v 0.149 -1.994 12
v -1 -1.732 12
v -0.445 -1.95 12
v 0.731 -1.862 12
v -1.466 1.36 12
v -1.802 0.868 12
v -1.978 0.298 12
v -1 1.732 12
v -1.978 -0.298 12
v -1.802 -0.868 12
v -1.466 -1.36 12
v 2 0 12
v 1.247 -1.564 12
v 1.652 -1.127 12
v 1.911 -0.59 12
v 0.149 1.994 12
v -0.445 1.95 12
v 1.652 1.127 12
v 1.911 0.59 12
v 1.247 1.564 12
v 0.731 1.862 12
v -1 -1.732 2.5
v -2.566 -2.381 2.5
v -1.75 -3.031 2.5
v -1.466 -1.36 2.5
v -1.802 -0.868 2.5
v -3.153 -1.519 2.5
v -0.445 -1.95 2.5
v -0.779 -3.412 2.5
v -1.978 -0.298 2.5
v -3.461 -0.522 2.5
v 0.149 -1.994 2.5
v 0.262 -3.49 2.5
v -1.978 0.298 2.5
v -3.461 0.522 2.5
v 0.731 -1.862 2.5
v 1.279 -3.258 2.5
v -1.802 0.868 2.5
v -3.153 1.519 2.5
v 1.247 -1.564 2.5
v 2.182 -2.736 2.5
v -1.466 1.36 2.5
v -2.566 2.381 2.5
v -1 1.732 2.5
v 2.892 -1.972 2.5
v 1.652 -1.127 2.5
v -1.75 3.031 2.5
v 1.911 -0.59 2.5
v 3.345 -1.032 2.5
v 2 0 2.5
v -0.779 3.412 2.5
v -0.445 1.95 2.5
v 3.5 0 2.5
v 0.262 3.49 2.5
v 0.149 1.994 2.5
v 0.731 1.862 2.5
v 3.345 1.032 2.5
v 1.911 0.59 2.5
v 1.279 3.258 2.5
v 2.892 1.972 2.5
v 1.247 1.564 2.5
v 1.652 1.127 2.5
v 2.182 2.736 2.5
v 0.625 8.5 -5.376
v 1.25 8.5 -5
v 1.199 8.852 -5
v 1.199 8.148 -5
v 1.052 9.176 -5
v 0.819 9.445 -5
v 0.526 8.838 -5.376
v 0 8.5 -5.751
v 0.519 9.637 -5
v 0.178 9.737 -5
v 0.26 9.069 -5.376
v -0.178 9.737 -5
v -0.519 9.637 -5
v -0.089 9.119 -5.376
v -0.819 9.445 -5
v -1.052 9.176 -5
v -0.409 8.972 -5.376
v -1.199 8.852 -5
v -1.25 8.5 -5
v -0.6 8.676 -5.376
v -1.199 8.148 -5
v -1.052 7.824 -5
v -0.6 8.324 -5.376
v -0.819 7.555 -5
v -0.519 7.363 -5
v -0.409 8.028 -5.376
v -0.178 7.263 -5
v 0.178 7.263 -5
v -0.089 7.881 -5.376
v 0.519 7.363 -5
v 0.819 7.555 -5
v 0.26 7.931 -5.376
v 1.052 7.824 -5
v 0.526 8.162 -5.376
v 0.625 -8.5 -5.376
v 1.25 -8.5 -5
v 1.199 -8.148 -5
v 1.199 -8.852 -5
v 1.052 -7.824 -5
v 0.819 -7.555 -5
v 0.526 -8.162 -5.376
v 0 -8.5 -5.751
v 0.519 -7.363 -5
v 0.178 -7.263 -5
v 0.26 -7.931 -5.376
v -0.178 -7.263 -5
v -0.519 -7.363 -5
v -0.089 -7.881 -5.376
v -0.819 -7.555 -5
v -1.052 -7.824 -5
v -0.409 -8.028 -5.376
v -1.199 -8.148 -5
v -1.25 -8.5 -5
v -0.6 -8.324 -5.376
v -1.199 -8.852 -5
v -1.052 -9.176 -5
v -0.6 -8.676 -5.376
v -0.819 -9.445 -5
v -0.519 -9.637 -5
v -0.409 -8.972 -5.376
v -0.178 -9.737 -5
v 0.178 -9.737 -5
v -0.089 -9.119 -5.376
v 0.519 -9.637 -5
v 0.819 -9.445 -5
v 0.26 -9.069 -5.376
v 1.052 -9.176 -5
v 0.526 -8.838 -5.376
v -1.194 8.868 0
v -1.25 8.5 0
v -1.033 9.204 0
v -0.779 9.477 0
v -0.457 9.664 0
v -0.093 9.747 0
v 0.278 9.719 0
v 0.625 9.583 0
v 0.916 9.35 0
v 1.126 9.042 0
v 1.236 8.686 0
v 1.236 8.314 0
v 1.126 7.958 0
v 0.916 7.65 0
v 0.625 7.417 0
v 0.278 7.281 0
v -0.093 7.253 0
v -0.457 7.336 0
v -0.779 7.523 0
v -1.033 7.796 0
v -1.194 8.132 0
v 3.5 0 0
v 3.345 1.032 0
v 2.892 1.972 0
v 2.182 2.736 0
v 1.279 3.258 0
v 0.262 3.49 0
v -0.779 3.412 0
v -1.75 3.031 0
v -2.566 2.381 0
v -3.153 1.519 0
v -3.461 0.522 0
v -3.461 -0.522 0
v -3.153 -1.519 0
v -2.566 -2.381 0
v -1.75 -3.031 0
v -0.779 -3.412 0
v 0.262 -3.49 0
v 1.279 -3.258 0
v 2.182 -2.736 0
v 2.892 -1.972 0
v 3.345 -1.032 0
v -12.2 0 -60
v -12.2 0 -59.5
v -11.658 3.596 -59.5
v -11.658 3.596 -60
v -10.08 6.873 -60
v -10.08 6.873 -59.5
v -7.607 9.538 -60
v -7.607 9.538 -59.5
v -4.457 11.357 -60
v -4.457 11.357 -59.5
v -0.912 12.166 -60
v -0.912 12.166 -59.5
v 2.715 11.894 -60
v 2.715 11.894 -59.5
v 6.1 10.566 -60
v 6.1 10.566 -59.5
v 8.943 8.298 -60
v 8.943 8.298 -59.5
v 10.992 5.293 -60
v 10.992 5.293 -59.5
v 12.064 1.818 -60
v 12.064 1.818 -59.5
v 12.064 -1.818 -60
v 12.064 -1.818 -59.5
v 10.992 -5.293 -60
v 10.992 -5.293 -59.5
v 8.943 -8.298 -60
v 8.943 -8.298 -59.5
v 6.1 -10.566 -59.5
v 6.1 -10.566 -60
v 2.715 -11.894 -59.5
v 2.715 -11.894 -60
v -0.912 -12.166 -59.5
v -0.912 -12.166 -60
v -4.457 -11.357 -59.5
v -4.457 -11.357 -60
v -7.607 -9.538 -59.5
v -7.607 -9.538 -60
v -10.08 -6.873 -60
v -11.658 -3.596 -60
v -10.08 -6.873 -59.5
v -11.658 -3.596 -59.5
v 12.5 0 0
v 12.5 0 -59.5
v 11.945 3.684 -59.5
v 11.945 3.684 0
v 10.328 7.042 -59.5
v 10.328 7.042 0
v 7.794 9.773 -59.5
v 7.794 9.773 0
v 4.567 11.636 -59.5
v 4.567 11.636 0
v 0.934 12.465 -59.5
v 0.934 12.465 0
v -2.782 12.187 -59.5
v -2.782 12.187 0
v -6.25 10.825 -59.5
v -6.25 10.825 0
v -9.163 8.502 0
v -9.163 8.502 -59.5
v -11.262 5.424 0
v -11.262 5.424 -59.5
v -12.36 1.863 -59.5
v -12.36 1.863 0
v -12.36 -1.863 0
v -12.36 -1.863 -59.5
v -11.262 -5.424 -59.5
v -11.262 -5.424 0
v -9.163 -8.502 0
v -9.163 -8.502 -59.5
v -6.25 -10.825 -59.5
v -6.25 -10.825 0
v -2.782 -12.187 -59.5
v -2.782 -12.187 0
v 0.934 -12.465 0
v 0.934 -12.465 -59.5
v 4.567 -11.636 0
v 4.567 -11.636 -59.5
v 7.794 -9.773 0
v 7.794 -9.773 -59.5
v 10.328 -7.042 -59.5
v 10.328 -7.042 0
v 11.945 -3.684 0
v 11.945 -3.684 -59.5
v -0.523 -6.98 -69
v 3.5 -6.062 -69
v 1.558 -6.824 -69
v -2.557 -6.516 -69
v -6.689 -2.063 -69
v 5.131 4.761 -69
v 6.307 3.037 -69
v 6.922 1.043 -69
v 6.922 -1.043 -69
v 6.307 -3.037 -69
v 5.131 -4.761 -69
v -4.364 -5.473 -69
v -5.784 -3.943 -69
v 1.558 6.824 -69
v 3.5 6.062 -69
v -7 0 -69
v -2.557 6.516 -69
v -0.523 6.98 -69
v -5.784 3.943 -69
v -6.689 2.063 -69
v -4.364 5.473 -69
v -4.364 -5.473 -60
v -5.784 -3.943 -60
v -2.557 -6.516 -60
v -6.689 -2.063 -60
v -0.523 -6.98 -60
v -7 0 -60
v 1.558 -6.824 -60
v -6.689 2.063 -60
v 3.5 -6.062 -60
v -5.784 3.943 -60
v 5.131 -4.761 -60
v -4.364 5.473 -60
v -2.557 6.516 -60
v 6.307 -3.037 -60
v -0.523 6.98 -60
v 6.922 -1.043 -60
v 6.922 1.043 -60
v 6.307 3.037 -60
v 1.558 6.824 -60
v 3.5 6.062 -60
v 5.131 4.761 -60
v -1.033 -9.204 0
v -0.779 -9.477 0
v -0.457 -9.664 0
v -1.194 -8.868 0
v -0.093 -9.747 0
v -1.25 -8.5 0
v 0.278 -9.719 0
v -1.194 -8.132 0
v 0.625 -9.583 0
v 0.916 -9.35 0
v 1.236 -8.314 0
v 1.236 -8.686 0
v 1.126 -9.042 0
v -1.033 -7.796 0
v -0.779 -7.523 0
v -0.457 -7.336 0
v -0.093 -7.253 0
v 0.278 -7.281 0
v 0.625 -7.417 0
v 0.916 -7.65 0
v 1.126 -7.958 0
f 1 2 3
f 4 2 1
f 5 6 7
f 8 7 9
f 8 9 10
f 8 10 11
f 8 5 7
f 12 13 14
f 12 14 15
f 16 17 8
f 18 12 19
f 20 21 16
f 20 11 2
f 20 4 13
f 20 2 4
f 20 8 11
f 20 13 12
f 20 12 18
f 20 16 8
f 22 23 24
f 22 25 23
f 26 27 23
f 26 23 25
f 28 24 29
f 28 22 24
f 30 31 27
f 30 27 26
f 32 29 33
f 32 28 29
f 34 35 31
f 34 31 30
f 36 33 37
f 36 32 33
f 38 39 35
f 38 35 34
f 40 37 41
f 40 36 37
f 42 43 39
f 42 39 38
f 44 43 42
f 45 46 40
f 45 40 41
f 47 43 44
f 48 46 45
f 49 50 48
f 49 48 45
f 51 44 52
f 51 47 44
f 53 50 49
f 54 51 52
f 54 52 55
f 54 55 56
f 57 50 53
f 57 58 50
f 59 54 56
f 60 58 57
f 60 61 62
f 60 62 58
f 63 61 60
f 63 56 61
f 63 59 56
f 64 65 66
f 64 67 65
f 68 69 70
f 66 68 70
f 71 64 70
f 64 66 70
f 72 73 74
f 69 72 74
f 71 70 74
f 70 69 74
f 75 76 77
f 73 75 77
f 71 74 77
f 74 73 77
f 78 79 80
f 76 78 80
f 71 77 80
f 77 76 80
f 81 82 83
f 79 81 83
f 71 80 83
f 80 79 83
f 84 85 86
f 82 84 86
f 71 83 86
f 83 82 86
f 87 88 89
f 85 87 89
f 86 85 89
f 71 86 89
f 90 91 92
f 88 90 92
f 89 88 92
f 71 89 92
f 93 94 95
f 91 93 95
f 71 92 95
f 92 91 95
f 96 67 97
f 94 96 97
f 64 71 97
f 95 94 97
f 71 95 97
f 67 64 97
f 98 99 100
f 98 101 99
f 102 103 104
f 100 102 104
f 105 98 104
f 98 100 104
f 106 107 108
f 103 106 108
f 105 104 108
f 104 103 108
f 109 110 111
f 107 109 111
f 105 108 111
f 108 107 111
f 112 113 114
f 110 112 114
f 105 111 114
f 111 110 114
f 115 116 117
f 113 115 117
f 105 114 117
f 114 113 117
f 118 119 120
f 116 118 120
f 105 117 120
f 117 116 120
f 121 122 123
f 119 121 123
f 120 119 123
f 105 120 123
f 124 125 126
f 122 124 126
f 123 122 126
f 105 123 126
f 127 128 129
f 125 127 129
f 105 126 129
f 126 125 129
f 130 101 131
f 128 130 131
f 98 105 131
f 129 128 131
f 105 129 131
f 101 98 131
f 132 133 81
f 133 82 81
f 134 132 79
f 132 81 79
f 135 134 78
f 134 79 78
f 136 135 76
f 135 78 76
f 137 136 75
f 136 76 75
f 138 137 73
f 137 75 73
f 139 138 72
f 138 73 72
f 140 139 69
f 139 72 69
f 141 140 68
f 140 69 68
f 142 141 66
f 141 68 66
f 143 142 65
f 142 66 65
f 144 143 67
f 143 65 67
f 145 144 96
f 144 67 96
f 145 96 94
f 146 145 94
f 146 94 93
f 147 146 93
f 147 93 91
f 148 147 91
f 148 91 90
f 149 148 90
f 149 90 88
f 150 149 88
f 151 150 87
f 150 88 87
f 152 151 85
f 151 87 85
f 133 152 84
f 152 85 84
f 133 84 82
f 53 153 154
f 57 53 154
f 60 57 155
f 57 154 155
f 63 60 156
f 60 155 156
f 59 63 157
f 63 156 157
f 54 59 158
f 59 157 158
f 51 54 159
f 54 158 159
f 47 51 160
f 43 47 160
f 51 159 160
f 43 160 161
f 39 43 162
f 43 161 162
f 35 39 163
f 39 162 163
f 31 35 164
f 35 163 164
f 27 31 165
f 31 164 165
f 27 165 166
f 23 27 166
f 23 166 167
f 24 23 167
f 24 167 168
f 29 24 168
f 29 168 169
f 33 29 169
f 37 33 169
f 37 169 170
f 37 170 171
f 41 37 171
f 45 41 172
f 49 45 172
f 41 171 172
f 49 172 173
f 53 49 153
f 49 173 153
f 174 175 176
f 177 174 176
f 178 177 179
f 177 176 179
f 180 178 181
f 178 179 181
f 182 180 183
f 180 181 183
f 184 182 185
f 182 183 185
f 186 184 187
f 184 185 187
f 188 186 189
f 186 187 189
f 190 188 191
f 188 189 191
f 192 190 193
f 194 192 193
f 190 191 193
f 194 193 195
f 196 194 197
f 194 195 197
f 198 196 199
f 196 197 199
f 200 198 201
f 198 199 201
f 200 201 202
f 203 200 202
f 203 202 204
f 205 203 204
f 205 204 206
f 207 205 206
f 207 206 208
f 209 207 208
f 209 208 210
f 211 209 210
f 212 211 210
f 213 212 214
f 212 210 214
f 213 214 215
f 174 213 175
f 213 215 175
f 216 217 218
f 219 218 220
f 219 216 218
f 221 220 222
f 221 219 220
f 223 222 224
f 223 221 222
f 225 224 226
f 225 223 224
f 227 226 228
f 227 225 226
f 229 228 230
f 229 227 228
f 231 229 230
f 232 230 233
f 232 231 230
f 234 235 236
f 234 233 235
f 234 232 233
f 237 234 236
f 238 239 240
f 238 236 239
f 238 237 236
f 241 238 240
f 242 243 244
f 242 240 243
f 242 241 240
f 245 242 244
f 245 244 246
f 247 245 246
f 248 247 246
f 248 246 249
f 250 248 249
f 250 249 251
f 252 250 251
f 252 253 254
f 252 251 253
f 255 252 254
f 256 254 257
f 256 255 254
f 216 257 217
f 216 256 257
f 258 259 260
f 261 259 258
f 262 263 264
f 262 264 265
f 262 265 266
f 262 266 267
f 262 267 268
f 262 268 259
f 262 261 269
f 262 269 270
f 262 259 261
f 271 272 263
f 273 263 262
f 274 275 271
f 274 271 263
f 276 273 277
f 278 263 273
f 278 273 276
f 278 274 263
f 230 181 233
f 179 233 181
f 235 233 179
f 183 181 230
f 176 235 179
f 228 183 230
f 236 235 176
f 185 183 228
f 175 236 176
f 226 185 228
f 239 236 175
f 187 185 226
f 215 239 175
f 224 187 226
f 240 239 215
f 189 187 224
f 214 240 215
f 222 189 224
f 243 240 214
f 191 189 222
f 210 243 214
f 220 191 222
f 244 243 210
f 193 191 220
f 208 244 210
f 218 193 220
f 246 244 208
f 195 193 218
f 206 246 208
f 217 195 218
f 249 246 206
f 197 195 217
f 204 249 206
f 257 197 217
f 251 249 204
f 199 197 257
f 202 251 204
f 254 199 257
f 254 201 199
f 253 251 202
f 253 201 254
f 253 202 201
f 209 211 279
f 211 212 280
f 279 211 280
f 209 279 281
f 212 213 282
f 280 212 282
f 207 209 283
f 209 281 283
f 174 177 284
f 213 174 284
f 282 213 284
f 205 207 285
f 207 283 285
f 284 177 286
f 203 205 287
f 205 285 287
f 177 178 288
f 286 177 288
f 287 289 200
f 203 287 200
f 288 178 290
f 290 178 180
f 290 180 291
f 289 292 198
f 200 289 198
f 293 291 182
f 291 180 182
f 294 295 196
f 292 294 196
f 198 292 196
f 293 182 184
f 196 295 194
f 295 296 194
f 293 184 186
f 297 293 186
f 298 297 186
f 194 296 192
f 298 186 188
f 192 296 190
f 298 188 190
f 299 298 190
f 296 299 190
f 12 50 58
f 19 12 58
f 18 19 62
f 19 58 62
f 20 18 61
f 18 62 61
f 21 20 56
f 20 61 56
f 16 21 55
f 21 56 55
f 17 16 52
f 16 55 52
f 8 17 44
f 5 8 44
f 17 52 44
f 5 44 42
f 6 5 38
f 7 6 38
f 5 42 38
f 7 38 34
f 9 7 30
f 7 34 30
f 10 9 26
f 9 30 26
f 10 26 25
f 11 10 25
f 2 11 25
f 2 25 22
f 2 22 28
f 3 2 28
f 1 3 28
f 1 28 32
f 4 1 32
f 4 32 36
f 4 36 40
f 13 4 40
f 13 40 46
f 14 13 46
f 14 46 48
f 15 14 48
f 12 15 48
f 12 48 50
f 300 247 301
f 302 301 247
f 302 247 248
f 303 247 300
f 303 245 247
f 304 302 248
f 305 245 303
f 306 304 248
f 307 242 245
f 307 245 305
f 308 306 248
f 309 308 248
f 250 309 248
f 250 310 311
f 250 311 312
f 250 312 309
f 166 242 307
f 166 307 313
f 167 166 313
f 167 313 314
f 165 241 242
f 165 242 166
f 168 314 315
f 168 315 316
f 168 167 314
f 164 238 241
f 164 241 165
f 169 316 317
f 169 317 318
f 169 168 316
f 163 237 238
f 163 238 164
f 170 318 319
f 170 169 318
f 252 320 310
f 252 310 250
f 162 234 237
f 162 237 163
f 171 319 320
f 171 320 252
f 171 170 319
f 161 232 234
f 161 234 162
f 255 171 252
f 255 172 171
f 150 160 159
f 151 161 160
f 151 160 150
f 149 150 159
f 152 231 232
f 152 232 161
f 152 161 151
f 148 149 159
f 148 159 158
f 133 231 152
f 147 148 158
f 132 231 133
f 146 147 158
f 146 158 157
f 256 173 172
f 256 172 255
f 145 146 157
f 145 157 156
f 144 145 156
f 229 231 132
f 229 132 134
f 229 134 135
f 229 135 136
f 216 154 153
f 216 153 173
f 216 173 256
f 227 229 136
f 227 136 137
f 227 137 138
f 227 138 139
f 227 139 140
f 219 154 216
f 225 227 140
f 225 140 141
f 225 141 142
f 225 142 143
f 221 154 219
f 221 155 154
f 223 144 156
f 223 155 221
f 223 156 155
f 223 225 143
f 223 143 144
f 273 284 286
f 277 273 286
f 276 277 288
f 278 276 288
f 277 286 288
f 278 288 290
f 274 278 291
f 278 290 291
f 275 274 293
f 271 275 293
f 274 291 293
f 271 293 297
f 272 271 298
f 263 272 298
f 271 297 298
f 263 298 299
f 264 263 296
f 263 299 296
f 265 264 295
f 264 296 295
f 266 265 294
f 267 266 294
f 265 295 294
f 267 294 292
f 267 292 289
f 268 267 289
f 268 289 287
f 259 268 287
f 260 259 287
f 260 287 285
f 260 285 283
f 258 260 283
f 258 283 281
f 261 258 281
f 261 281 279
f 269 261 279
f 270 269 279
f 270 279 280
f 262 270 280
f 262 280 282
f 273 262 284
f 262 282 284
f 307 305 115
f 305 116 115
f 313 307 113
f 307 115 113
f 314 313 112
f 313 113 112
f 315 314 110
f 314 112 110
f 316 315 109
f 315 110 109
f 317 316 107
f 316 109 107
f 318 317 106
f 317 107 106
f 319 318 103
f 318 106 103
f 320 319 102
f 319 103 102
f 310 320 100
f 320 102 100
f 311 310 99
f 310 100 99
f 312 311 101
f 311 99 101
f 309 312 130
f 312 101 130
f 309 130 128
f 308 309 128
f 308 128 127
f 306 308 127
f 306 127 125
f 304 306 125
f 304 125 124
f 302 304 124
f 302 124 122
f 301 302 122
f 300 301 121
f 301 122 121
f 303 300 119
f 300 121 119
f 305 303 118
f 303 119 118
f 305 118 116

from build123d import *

# Parameters (mm, degrees)
SKETCH1_R                 = 12.5
BOSS_EXTRUDE1_DEPTH       = 60
SKETCH2_R                 = 3.5
BOSS_EXTRUDE2_DEPTH       = 2.5
SKETCH2_3_R               = 2
BOSS_EXTRUDE3_DEPTH       = 12
M3X0_5_TAPPED_HOLE1_D     = 2.5
M3X0_5_TAPPED_HOLE1_DEPTH = 4.99999
M3X0_5_TAPPED_HOLE1_TIP   = 0.751075774
CUT_EXTRUDE1_START        = -0.5
SKETCH6_R                 = 12.5
SKETCH6_R_2               = 12.2
CUT_EXTRUDE1_DEPTH        = 0.5
SKETCH5_R                 = 7
BOSS_EXTRUDE4_DEPTH       = 9


with BuildPart() as part:
    # Sketch1 → Boss-Extrude1 (new body)
    with BuildSketch(Plane.XY):
        Circle(SKETCH1_R)
    extrude(amount=-BOSS_EXTRUDE1_DEPTH)

    # Sketch2 → Boss-Extrude2 (add)
    with BuildSketch(Plane.XY):
        Circle(SKETCH2_R)
    extrude(amount=BOSS_EXTRUDE2_DEPTH)

    # Sketch2<3> → Boss-Extrude3 (add)
    with BuildSketch(Plane.XY):
        Circle(SKETCH2_3_R)
    extrude(amount=BOSS_EXTRUDE3_DEPTH)

    # M3x0.5 Tapped Hole1
    with Locations(Plane.XY):
        with Locations((0, 8.5), (0, -8.5)):
            Hole(M3X0_5_TAPPED_HOLE1_D / 2, depth=M3X0_5_TAPPED_HOLE1_DEPTH)
            with Locations((0, 0, -(M3X0_5_TAPPED_HOLE1_DEPTH + M3X0_5_TAPPED_HOLE1_TIP / 2))):  # 118° drill point
                Cone(0, M3X0_5_TAPPED_HOLE1_D / 2, M3X0_5_TAPPED_HOLE1_TIP, mode=Mode.SUBTRACT)

    # Sketch6 → Cut-Extrude1 (cut)
    with BuildSketch(Plane(origin=(0, 0, -60), x_dir=(-1, 0, 0), z_dir=(0, 0, -1)).offset(CUT_EXTRUDE1_START)):
        Circle(SKETCH6_R)
        Circle(SKETCH6_R_2, mode=Mode.SUBTRACT)
    extrude(amount=CUT_EXTRUDE1_DEPTH, mode=Mode.SUBTRACT)

    # Sketch5 → Boss-Extrude4 (add)
    with BuildSketch(Plane(origin=(0, 0, -60), x_dir=(-1, 0, 0), z_dir=(0, 0, -1))):
        Circle(SKETCH5_R)
    extrude(amount=BOSS_EXTRUDE4_DEPTH)


solid = part.part
